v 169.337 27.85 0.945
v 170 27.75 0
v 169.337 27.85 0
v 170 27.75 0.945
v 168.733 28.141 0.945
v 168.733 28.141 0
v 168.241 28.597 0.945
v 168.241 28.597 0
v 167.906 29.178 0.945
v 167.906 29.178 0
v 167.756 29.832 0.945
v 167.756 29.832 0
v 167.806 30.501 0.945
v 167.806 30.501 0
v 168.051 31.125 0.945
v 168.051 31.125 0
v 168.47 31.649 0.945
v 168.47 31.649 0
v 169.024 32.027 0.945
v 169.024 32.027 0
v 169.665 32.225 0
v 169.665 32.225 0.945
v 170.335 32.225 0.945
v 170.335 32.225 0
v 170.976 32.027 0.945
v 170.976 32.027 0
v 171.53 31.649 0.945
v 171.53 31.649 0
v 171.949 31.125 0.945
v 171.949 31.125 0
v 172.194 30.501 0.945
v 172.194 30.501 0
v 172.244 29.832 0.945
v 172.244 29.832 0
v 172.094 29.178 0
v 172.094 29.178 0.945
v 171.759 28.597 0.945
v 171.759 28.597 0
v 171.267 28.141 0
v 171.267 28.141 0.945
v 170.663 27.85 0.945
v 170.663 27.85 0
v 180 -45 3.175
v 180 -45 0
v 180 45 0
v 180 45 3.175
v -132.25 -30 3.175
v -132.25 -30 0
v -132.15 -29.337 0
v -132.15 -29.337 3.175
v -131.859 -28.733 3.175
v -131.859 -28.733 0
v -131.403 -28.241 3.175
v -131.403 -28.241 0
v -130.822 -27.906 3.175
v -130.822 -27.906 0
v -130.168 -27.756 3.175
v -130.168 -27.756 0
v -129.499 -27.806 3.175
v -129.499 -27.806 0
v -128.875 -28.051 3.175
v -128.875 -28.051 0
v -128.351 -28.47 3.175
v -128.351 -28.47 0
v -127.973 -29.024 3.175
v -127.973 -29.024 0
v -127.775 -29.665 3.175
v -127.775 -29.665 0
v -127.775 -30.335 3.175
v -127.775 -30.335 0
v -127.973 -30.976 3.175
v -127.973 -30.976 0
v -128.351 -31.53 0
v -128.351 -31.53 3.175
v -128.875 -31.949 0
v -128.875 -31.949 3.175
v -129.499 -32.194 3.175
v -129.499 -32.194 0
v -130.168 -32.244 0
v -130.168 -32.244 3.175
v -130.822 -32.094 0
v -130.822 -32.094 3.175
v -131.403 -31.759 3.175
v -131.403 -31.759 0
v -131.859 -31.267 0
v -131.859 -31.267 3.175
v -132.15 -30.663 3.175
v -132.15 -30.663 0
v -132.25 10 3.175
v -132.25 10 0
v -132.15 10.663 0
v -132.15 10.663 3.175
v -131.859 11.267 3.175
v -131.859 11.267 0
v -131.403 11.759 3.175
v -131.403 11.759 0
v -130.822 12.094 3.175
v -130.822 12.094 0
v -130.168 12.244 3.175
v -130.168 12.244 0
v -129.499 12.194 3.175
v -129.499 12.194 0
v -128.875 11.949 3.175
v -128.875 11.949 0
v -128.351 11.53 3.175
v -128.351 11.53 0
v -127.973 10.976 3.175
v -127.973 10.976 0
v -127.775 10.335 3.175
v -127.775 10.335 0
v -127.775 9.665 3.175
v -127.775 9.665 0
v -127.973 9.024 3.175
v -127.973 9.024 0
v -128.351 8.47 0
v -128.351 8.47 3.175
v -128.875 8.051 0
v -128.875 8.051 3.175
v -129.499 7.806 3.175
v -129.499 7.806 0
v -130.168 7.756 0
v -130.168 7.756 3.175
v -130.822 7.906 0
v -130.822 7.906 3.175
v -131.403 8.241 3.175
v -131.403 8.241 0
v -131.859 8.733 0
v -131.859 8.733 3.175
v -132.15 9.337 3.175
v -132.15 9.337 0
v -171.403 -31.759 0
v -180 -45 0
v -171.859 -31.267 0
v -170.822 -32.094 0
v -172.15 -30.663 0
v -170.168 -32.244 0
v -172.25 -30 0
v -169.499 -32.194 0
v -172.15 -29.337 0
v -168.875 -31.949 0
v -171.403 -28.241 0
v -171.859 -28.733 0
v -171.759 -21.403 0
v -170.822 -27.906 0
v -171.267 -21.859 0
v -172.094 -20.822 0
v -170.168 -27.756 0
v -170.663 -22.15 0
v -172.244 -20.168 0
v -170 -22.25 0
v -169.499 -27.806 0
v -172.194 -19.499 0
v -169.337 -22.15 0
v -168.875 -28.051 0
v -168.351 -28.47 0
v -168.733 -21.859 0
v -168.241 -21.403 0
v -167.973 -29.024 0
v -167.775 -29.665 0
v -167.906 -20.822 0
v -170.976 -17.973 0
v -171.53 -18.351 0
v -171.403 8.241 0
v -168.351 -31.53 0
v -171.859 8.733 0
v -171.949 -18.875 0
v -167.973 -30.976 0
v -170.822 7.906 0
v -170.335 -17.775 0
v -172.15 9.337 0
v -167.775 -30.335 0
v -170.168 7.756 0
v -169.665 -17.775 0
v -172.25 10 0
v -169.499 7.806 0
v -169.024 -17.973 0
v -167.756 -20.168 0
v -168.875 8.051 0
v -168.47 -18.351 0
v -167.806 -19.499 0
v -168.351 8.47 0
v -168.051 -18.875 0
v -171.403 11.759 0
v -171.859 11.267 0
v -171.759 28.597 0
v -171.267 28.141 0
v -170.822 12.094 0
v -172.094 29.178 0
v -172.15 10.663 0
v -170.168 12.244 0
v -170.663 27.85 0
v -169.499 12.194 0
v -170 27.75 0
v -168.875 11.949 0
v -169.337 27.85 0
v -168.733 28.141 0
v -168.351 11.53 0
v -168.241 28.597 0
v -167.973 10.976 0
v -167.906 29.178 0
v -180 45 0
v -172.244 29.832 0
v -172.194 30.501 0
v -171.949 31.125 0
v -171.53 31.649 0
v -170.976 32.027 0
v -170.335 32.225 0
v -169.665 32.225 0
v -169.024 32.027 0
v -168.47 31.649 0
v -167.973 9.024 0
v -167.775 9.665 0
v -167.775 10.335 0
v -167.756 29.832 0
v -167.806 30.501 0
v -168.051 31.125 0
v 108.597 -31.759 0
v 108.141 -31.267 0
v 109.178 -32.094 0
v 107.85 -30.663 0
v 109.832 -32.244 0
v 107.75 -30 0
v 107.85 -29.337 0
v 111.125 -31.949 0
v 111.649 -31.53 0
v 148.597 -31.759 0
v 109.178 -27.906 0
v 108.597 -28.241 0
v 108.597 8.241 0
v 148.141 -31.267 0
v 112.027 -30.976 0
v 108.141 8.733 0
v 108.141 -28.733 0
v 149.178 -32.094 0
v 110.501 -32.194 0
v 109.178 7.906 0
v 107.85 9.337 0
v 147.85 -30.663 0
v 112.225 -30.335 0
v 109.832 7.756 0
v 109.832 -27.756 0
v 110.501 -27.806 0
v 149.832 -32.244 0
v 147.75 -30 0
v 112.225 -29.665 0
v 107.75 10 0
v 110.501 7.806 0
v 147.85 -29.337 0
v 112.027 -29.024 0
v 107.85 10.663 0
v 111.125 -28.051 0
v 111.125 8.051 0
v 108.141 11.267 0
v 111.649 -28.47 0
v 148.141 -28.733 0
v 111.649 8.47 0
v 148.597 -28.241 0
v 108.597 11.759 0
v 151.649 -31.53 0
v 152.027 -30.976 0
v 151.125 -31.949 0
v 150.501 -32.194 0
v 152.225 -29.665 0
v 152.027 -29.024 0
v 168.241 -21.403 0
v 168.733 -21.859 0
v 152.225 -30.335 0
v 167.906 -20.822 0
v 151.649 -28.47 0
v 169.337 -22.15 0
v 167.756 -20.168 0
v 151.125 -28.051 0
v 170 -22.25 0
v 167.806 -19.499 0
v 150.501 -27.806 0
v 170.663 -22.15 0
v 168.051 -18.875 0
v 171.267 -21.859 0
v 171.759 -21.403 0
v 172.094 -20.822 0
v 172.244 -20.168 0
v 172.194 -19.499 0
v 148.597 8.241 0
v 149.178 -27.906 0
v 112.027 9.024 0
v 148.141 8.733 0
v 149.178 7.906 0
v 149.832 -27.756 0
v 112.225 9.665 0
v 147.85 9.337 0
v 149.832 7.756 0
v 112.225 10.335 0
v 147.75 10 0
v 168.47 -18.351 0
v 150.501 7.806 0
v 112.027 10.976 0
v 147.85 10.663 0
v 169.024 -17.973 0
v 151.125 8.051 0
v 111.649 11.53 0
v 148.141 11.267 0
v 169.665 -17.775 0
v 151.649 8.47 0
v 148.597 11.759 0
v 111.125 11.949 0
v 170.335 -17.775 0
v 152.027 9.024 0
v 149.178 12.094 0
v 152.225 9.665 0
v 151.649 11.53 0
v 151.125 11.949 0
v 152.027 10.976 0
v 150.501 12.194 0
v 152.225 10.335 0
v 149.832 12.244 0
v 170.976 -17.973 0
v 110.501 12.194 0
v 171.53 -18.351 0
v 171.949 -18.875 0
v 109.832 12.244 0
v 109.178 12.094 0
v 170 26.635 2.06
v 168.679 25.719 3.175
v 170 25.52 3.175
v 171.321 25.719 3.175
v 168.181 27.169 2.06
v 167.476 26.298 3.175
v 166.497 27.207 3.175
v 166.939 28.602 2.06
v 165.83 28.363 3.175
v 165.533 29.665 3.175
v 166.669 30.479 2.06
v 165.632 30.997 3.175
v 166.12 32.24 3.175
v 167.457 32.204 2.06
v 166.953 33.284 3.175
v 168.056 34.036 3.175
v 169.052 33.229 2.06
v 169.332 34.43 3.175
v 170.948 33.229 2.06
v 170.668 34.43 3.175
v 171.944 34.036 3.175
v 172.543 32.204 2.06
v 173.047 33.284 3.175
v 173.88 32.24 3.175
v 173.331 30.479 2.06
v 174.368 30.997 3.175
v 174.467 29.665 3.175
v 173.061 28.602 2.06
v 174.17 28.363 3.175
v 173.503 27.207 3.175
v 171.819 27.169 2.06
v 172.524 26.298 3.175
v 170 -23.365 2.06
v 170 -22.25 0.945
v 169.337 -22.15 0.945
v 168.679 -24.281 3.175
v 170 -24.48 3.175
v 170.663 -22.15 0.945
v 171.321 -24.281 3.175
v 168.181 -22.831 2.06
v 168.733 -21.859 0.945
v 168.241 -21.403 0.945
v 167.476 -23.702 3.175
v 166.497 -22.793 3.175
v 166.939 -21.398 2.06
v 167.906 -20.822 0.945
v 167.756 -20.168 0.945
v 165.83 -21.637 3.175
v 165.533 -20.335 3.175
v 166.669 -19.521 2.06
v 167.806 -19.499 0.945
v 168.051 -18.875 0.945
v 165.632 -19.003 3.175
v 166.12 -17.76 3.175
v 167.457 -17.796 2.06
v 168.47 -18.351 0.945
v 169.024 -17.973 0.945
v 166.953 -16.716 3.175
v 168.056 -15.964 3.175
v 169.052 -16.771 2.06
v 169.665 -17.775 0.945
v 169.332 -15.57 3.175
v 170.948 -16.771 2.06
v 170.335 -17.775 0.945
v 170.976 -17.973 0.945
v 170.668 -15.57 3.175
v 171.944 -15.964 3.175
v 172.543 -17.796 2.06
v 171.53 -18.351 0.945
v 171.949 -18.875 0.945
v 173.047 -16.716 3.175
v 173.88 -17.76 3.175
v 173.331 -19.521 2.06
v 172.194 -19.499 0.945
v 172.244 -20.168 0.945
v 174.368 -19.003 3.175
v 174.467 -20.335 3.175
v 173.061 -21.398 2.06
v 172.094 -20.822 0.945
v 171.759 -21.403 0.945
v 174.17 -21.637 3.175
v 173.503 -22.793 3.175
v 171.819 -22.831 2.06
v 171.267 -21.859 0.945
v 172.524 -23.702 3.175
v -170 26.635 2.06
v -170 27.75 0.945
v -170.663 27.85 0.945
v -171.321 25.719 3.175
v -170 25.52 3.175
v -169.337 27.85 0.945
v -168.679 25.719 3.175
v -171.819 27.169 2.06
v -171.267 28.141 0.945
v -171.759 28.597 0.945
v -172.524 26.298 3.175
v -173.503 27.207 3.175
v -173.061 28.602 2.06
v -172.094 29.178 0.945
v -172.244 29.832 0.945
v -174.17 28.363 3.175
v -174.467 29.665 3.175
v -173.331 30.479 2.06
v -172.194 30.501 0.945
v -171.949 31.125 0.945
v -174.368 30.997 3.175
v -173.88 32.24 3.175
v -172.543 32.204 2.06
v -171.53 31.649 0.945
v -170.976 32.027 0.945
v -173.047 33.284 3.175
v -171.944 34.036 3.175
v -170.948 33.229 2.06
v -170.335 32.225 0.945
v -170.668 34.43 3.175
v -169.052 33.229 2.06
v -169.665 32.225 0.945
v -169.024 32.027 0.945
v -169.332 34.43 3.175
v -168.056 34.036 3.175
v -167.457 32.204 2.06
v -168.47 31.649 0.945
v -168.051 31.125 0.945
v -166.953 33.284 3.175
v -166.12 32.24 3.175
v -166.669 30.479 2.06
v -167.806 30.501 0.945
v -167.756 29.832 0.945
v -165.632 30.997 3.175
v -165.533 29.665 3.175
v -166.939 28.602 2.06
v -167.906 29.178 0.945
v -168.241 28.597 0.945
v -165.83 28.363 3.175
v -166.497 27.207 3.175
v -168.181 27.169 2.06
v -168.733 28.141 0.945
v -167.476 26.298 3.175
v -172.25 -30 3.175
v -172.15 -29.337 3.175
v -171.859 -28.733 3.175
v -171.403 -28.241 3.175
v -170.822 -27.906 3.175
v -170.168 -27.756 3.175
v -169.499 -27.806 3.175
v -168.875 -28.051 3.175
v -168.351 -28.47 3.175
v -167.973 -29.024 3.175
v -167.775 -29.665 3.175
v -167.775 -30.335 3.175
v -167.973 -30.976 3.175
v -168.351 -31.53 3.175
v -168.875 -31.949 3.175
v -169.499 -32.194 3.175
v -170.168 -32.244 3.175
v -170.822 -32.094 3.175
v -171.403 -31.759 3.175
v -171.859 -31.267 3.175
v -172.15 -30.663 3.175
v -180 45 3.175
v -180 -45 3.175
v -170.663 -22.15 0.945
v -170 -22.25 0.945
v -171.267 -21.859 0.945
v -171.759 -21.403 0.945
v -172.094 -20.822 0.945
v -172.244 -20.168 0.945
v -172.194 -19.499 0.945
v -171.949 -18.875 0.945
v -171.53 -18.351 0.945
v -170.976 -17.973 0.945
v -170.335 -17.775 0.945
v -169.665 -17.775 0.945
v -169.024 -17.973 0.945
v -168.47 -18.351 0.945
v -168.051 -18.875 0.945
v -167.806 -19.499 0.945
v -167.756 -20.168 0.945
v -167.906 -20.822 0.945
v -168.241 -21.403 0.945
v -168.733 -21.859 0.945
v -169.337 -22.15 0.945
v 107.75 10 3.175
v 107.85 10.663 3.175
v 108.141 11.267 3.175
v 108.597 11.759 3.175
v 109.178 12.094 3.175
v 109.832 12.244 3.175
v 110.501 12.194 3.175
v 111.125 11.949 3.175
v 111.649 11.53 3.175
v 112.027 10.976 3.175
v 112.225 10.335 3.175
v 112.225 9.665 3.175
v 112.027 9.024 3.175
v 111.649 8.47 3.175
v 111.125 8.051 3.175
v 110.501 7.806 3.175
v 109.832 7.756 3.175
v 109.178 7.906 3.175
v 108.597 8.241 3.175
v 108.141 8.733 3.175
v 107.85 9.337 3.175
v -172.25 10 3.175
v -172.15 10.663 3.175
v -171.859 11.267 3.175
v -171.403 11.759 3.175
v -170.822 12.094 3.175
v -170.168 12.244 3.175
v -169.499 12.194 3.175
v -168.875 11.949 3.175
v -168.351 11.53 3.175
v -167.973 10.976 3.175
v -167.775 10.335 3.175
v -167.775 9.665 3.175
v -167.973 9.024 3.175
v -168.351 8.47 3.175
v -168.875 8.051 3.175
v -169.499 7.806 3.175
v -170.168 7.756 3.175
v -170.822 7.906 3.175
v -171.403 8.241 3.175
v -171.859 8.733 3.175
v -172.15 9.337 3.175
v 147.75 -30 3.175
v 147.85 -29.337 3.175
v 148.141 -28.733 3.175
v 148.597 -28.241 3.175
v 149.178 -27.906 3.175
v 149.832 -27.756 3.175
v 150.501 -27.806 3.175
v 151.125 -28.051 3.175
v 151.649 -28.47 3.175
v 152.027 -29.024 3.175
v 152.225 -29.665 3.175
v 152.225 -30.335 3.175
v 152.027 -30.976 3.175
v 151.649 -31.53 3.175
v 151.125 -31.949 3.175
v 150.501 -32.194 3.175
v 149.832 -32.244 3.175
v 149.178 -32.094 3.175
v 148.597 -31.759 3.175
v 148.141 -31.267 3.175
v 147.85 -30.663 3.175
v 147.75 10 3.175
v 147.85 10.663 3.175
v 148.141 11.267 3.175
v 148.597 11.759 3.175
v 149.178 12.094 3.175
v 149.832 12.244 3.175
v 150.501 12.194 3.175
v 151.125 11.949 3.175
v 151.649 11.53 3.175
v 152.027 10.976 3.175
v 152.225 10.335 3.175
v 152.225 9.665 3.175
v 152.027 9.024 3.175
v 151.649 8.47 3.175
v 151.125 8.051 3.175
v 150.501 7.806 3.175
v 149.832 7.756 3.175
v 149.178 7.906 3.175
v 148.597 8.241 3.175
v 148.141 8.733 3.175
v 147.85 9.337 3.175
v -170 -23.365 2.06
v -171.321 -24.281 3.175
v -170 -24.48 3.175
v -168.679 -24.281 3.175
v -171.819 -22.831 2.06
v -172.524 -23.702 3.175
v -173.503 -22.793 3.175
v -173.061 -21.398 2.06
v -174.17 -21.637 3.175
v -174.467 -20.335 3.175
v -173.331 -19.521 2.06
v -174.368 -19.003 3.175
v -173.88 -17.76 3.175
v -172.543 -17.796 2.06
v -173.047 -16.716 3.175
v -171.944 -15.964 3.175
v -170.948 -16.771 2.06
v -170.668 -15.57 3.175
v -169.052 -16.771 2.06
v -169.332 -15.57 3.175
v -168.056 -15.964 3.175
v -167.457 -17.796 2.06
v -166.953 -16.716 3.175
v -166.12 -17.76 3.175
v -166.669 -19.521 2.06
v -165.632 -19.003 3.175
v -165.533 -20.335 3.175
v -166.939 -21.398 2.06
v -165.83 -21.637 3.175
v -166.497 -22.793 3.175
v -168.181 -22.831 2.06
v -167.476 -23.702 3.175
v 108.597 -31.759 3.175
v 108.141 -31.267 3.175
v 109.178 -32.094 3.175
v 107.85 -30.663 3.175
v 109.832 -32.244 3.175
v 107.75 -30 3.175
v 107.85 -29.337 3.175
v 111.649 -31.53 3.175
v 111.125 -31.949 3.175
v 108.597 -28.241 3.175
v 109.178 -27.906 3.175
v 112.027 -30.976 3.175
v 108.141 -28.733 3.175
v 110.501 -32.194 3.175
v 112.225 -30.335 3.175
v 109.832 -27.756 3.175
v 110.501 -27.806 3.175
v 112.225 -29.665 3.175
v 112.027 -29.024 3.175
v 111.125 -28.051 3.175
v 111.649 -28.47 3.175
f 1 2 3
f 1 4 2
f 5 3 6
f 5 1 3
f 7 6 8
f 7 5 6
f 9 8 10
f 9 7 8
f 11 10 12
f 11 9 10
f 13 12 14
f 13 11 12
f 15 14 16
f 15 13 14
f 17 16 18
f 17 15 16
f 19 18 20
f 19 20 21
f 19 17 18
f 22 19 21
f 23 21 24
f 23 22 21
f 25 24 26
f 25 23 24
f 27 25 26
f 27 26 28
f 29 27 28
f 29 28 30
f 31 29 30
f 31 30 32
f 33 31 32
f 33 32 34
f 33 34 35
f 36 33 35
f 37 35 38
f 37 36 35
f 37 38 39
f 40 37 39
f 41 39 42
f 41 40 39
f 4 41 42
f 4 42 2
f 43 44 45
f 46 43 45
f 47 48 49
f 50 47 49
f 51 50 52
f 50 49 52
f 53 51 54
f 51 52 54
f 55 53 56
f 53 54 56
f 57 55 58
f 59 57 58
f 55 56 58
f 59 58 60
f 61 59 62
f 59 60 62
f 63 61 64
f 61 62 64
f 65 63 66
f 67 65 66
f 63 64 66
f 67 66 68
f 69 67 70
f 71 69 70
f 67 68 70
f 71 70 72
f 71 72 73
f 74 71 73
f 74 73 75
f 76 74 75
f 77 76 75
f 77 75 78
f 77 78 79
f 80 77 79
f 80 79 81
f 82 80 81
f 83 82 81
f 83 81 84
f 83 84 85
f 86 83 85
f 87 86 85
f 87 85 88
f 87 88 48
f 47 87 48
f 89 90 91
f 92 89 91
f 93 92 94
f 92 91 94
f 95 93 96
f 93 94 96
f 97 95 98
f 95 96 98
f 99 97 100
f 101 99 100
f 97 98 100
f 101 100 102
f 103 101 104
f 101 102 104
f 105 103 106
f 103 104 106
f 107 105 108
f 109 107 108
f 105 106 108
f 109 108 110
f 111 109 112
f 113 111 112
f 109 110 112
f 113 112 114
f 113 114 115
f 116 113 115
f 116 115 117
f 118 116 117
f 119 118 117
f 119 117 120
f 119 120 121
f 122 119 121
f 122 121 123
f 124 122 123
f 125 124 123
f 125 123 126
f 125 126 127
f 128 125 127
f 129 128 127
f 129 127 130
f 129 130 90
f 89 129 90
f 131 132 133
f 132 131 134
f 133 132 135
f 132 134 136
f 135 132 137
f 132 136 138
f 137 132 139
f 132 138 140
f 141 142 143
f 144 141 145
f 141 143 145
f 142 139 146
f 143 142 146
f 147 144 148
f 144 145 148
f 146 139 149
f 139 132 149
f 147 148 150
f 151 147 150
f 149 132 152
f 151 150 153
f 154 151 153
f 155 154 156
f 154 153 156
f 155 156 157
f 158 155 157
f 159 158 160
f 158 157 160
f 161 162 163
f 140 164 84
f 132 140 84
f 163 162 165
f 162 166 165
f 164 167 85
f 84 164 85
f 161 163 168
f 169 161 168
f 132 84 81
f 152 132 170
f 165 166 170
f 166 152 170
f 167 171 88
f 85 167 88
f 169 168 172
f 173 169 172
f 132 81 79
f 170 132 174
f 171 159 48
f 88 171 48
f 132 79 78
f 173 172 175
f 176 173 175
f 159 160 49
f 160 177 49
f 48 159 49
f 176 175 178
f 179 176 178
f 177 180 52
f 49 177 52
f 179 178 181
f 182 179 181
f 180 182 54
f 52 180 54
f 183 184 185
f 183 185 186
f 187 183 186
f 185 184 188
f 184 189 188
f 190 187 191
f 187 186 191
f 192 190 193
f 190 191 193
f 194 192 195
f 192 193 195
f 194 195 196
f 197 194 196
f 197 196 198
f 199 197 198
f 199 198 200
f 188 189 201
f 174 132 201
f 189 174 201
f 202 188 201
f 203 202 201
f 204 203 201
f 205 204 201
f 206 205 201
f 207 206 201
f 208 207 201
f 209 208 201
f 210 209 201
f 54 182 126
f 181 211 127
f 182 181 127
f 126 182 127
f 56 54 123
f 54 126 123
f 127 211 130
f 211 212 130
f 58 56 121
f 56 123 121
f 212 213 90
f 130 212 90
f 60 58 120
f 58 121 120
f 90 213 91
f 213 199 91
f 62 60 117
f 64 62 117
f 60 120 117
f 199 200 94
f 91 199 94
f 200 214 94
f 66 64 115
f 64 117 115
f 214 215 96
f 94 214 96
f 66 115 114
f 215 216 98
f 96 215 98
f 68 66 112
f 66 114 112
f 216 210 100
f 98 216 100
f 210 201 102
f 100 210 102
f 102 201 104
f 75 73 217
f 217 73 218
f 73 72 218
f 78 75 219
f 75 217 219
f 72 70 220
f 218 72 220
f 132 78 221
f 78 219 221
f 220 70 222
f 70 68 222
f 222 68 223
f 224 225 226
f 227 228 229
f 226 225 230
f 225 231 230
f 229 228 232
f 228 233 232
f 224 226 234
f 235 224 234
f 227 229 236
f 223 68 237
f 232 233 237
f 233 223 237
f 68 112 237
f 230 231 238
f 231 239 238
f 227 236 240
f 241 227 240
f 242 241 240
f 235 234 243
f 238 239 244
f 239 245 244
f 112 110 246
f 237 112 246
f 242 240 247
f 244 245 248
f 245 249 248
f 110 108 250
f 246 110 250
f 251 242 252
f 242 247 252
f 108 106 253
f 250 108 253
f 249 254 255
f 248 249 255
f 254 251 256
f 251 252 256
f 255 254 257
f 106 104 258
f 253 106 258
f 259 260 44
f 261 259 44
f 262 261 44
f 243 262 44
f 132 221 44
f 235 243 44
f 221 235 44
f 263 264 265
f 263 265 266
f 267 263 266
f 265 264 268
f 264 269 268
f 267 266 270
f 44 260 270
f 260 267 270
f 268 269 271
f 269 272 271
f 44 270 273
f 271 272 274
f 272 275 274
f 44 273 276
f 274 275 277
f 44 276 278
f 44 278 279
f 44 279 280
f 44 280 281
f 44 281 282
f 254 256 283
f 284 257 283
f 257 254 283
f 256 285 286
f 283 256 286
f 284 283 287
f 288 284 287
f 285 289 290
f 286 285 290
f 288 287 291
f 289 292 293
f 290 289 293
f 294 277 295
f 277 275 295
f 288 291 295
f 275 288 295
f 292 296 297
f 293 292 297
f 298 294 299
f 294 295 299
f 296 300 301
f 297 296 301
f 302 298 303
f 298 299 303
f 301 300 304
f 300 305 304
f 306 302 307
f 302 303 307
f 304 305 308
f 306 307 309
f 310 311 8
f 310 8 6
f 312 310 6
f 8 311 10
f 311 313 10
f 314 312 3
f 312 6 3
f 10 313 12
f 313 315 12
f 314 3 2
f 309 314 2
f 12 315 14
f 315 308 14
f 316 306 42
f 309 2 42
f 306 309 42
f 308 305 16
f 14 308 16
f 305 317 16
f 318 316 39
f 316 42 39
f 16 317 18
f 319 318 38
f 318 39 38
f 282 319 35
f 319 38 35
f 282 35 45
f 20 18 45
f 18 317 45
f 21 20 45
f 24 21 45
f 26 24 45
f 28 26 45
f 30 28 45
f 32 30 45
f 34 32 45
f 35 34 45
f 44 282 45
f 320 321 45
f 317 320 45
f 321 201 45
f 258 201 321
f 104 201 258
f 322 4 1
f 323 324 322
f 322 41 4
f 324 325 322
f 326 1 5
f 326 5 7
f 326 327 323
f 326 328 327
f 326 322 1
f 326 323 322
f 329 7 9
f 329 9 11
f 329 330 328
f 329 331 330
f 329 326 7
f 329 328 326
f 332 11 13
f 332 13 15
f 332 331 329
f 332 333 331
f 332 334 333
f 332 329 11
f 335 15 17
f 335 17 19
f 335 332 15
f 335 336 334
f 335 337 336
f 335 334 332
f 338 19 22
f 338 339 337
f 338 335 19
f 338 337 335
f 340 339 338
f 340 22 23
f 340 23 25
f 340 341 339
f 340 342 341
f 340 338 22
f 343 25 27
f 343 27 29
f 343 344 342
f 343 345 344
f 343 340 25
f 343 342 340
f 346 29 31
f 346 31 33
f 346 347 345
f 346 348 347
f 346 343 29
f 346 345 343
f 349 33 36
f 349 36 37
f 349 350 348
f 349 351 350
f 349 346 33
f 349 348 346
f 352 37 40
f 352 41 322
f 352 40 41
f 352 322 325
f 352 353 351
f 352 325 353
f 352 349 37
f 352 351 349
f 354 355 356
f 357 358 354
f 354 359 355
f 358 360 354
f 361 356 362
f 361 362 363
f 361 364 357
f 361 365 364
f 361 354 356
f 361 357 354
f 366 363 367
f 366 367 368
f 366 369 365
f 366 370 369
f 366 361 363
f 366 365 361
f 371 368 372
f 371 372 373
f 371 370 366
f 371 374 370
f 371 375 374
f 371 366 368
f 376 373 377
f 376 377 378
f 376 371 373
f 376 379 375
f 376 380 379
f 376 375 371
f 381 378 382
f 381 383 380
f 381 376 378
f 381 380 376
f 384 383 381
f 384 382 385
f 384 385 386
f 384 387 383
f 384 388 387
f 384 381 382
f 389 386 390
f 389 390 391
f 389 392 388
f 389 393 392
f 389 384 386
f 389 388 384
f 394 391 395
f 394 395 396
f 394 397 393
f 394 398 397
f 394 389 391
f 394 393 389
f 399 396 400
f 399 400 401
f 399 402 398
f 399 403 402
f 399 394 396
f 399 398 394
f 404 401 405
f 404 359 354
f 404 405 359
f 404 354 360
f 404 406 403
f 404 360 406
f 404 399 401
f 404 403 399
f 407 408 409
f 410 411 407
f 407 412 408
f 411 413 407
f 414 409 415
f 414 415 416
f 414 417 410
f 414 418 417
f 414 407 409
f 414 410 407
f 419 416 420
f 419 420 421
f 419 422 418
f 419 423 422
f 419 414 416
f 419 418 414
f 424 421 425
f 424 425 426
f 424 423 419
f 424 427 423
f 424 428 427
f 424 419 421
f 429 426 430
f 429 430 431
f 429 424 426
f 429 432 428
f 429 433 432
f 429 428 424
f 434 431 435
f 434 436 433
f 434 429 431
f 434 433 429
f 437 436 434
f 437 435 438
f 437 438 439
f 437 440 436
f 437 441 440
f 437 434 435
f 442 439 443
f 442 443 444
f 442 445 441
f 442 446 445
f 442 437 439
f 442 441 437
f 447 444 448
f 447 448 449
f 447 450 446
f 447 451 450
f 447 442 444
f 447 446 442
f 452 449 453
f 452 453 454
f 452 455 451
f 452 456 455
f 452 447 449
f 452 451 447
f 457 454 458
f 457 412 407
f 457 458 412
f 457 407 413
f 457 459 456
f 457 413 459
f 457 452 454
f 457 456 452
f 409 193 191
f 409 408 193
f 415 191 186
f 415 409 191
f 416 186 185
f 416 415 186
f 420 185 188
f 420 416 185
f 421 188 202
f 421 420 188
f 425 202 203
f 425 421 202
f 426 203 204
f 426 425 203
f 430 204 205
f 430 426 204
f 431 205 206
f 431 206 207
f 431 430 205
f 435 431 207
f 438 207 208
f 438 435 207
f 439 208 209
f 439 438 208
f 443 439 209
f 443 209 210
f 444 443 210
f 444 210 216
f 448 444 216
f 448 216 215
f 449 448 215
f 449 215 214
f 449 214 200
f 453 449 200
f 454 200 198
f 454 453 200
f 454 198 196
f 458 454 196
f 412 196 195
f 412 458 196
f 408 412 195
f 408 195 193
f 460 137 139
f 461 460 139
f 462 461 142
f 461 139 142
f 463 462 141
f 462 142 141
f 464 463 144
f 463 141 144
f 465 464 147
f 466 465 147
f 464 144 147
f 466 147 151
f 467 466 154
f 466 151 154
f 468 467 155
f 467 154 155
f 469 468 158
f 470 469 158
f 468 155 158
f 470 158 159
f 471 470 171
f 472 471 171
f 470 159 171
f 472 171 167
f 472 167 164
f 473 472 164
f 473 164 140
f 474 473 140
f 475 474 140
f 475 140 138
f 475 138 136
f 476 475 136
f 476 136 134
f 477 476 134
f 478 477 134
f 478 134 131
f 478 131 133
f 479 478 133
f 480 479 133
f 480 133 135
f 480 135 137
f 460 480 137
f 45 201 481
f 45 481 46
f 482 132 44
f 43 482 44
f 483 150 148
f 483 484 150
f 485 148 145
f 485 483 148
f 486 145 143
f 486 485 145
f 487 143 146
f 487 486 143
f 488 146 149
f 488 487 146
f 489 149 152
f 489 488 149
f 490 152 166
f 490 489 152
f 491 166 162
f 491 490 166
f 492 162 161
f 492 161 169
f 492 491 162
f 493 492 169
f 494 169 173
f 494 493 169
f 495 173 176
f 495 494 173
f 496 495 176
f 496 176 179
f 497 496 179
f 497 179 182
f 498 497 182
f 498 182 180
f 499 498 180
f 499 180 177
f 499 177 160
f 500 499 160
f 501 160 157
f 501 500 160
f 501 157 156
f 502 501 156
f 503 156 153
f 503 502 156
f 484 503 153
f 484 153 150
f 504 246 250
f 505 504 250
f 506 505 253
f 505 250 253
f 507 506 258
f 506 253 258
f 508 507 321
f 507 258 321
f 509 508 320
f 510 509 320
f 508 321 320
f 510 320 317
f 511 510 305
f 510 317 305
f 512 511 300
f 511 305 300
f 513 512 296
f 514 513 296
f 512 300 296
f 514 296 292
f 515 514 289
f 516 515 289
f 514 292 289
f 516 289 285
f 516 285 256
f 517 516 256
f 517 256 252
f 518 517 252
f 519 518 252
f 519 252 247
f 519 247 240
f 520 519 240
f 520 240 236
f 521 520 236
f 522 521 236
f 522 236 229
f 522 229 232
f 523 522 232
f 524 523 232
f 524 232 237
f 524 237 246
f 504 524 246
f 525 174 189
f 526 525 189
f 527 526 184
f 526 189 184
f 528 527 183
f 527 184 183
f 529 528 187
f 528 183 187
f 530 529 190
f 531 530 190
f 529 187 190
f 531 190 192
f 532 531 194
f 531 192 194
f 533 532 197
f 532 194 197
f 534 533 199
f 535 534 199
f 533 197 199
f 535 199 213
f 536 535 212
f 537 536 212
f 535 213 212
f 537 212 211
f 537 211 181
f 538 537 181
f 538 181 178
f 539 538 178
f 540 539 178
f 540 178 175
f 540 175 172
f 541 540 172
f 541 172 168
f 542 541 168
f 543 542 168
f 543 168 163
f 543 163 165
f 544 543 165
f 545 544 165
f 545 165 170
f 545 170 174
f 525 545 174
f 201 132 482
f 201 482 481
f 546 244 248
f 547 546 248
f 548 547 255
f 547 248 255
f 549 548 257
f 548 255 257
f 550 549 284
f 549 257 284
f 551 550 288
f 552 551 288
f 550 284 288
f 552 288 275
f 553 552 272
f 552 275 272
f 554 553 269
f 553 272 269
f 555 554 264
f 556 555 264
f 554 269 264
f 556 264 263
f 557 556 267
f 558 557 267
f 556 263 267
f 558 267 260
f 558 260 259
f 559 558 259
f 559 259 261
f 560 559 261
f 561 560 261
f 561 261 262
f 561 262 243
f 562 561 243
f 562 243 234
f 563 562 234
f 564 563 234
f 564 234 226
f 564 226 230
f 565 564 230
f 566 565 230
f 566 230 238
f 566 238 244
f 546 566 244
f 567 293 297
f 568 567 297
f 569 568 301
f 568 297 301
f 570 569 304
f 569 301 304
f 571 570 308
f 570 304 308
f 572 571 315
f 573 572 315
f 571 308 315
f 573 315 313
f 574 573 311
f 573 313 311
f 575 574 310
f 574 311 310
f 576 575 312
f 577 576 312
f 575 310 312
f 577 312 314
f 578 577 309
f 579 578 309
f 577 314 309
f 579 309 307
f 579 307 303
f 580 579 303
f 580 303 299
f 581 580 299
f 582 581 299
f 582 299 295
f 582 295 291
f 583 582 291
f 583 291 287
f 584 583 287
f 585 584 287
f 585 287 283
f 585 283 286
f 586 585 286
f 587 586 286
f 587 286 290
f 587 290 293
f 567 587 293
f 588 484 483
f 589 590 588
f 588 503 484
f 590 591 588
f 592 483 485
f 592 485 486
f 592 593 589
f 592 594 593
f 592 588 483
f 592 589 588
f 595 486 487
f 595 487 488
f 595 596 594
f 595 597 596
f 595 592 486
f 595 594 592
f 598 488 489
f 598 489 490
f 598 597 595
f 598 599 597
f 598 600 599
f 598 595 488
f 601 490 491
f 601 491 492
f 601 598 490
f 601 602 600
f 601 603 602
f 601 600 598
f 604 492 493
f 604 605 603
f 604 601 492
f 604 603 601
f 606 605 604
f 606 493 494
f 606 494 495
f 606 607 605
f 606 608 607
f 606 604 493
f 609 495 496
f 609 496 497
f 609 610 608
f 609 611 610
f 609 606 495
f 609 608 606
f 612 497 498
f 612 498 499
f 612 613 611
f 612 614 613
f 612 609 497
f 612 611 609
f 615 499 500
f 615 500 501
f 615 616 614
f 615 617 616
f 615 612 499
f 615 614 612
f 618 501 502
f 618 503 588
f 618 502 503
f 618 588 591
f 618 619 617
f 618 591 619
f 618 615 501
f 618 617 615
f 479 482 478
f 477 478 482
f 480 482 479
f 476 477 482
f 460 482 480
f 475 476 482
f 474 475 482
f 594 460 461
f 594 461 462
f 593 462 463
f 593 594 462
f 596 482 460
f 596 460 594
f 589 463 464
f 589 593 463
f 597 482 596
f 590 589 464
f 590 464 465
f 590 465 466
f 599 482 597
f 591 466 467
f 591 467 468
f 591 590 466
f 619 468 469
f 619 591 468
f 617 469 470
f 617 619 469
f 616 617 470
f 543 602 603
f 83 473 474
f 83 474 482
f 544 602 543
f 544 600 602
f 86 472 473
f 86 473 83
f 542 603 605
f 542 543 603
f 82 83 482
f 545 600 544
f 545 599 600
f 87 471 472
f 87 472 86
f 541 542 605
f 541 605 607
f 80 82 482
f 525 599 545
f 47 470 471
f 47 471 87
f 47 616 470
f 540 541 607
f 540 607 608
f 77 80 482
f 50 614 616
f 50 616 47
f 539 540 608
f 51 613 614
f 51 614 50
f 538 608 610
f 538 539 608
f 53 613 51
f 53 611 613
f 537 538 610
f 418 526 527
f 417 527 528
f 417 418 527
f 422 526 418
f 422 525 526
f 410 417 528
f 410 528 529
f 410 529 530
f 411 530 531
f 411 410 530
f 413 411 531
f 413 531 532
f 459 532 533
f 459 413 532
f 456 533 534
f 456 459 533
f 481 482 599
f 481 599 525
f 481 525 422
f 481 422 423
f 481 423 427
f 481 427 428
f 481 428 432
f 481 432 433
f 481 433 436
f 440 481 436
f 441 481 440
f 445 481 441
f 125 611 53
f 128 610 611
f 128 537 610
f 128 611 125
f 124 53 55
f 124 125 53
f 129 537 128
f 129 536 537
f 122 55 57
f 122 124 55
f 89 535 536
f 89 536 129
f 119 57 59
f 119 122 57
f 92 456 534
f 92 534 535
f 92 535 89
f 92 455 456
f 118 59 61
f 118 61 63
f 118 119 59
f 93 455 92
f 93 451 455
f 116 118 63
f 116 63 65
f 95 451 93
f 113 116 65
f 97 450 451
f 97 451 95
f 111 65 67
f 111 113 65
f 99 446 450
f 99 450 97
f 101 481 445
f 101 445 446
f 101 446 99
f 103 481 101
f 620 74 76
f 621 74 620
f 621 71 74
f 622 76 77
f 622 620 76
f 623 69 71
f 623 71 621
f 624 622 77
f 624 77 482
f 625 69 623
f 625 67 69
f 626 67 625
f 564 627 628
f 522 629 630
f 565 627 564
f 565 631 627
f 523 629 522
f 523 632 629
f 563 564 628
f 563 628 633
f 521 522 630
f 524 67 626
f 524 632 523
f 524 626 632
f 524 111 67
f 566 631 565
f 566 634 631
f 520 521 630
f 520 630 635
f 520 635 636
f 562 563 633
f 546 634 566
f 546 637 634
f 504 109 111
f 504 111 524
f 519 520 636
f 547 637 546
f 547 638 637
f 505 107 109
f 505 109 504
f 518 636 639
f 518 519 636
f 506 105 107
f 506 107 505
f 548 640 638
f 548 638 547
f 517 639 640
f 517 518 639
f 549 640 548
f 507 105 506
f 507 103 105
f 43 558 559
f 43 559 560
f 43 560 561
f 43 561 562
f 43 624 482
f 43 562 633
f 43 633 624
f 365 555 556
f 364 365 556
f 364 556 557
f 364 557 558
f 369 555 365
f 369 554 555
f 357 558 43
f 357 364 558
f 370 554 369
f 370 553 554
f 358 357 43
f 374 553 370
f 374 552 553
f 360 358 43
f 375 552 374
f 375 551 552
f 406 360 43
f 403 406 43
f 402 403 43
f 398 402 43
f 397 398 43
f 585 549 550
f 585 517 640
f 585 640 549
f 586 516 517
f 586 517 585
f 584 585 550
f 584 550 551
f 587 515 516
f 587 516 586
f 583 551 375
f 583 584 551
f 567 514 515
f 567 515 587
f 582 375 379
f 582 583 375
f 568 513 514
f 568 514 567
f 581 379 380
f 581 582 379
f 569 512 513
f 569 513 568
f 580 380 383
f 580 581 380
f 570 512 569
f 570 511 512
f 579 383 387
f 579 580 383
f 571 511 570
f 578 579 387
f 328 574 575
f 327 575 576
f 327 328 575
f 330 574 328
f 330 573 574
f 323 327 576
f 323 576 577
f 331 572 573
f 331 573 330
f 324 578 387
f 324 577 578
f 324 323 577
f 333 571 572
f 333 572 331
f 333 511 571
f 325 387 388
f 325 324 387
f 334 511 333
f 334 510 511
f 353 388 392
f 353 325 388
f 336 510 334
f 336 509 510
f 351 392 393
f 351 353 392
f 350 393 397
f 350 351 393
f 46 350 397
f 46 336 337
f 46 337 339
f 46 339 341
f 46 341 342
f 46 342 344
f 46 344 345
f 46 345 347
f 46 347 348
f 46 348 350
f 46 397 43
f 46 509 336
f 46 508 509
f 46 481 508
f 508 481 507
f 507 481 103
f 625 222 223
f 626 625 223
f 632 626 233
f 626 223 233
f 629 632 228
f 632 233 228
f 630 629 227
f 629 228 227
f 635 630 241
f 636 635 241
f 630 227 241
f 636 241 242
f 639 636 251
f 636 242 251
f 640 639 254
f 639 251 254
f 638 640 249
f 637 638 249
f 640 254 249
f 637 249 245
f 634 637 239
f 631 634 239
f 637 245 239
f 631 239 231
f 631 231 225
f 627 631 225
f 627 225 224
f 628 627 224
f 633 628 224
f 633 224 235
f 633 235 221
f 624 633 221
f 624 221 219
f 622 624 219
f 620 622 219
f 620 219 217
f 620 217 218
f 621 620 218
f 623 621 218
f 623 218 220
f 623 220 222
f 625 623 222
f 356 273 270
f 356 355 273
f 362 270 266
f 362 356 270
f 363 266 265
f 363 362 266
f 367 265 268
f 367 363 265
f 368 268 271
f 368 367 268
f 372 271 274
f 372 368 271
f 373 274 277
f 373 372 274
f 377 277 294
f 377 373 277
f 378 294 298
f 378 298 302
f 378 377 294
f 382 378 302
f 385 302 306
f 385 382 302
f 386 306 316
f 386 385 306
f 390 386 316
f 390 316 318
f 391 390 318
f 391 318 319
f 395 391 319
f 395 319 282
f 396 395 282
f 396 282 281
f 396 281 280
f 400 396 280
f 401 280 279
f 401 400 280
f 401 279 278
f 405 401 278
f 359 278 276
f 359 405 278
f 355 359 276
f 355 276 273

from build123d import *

# Parameters (mm, degrees)
SKETCH1_W                    = 360
SKETCH1_H                    = 90
BOSS_EXTRUDE1_DEPTH          = 3.175
M4_CLEARANCE_HOLE1_D         = 4.5
CSK_FOR_M4_SFHCS1_AT_2_COUNT = 2
CSK_FOR_M4_SFHCS1_AT_2_PITCH = 343.656805549
CSK_FOR_M4_SFHCS1_AT_3_COUNT = 2
CSK_FOR_M4_SFHCS1_AT_3_PITCH = 340
CSK_FOR_M4_SFHCS1_AT_4_COUNT = 2
CSK_FOR_M4_SFHCS1_AT_4_PITCH = 50


with BuildPart() as part:
    # Sketch1 → Boss-Extrude1 (new body)
    with BuildSketch(Plane.XY):
        Rectangle(SKETCH1_W, SKETCH1_H)
    extrude(amount=BOSS_EXTRUDE1_DEPTH)

    # M4 Clearance Hole1 (through all)
    with Locations(Plane.XY.offset(3.175)):
        with Locations((-130, 10), (-170, -30), (-170, 10), (-130, -30), (110, 10), (150, 10), (150, -30), (110, -30)):
            Hole(M4_CLEARANCE_HOLE1_D / 2)

    # Sketch7 → CSK for M4 SFHCS1 (revolve, cut)
    with BuildSketch(Plane(origin=(170, 30, 3.175), x_dir=(0, -1, 0), z_dir=(1, 0, 0))):
        Polygon((0, 0), (0, 3.175), (2.25, 3.175), (2.25, 2.23), (4.48, 0), align=None)
    csk_for_m4_sfhcs1 = revolve(axis=Axis((170, 30, 9.525), (0, 0, -1)), mode=Mode.SUBTRACT)

    # CSK for M4 SFHCS1 at 2: CSK for M4 SFHCS1 ×2
    with Locations(*[Vector(-0.9893591353648533, -0.1454939904948314, 0) * (i * CSK_FOR_M4_SFHCS1_AT_2_PITCH) for i in range(1, CSK_FOR_M4_SFHCS1_AT_2_COUNT)]):
        add(csk_for_m4_sfhcs1, mode=Mode.SUBTRACT)

    # CSK for M4 SFHCS1 at 3: CSK for M4 SFHCS1 ×2
    with Locations(*[(-i * CSK_FOR_M4_SFHCS1_AT_3_PITCH, 0, 0) for i in range(1, CSK_FOR_M4_SFHCS1_AT_3_COUNT)]):
        add(csk_for_m4_sfhcs1, mode=Mode.SUBTRACT)

    # CSK for M4 SFHCS1 at 4: CSK for M4 SFHCS1 ×2
    with Locations(*[(0, -i * CSK_FOR_M4_SFHCS1_AT_4_PITCH, 0) for i in range(1, CSK_FOR_M4_SFHCS1_AT_4_COUNT)]):
        add(csk_for_m4_sfhcs1, mode=Mode.SUBTRACT)


solid = part.part
